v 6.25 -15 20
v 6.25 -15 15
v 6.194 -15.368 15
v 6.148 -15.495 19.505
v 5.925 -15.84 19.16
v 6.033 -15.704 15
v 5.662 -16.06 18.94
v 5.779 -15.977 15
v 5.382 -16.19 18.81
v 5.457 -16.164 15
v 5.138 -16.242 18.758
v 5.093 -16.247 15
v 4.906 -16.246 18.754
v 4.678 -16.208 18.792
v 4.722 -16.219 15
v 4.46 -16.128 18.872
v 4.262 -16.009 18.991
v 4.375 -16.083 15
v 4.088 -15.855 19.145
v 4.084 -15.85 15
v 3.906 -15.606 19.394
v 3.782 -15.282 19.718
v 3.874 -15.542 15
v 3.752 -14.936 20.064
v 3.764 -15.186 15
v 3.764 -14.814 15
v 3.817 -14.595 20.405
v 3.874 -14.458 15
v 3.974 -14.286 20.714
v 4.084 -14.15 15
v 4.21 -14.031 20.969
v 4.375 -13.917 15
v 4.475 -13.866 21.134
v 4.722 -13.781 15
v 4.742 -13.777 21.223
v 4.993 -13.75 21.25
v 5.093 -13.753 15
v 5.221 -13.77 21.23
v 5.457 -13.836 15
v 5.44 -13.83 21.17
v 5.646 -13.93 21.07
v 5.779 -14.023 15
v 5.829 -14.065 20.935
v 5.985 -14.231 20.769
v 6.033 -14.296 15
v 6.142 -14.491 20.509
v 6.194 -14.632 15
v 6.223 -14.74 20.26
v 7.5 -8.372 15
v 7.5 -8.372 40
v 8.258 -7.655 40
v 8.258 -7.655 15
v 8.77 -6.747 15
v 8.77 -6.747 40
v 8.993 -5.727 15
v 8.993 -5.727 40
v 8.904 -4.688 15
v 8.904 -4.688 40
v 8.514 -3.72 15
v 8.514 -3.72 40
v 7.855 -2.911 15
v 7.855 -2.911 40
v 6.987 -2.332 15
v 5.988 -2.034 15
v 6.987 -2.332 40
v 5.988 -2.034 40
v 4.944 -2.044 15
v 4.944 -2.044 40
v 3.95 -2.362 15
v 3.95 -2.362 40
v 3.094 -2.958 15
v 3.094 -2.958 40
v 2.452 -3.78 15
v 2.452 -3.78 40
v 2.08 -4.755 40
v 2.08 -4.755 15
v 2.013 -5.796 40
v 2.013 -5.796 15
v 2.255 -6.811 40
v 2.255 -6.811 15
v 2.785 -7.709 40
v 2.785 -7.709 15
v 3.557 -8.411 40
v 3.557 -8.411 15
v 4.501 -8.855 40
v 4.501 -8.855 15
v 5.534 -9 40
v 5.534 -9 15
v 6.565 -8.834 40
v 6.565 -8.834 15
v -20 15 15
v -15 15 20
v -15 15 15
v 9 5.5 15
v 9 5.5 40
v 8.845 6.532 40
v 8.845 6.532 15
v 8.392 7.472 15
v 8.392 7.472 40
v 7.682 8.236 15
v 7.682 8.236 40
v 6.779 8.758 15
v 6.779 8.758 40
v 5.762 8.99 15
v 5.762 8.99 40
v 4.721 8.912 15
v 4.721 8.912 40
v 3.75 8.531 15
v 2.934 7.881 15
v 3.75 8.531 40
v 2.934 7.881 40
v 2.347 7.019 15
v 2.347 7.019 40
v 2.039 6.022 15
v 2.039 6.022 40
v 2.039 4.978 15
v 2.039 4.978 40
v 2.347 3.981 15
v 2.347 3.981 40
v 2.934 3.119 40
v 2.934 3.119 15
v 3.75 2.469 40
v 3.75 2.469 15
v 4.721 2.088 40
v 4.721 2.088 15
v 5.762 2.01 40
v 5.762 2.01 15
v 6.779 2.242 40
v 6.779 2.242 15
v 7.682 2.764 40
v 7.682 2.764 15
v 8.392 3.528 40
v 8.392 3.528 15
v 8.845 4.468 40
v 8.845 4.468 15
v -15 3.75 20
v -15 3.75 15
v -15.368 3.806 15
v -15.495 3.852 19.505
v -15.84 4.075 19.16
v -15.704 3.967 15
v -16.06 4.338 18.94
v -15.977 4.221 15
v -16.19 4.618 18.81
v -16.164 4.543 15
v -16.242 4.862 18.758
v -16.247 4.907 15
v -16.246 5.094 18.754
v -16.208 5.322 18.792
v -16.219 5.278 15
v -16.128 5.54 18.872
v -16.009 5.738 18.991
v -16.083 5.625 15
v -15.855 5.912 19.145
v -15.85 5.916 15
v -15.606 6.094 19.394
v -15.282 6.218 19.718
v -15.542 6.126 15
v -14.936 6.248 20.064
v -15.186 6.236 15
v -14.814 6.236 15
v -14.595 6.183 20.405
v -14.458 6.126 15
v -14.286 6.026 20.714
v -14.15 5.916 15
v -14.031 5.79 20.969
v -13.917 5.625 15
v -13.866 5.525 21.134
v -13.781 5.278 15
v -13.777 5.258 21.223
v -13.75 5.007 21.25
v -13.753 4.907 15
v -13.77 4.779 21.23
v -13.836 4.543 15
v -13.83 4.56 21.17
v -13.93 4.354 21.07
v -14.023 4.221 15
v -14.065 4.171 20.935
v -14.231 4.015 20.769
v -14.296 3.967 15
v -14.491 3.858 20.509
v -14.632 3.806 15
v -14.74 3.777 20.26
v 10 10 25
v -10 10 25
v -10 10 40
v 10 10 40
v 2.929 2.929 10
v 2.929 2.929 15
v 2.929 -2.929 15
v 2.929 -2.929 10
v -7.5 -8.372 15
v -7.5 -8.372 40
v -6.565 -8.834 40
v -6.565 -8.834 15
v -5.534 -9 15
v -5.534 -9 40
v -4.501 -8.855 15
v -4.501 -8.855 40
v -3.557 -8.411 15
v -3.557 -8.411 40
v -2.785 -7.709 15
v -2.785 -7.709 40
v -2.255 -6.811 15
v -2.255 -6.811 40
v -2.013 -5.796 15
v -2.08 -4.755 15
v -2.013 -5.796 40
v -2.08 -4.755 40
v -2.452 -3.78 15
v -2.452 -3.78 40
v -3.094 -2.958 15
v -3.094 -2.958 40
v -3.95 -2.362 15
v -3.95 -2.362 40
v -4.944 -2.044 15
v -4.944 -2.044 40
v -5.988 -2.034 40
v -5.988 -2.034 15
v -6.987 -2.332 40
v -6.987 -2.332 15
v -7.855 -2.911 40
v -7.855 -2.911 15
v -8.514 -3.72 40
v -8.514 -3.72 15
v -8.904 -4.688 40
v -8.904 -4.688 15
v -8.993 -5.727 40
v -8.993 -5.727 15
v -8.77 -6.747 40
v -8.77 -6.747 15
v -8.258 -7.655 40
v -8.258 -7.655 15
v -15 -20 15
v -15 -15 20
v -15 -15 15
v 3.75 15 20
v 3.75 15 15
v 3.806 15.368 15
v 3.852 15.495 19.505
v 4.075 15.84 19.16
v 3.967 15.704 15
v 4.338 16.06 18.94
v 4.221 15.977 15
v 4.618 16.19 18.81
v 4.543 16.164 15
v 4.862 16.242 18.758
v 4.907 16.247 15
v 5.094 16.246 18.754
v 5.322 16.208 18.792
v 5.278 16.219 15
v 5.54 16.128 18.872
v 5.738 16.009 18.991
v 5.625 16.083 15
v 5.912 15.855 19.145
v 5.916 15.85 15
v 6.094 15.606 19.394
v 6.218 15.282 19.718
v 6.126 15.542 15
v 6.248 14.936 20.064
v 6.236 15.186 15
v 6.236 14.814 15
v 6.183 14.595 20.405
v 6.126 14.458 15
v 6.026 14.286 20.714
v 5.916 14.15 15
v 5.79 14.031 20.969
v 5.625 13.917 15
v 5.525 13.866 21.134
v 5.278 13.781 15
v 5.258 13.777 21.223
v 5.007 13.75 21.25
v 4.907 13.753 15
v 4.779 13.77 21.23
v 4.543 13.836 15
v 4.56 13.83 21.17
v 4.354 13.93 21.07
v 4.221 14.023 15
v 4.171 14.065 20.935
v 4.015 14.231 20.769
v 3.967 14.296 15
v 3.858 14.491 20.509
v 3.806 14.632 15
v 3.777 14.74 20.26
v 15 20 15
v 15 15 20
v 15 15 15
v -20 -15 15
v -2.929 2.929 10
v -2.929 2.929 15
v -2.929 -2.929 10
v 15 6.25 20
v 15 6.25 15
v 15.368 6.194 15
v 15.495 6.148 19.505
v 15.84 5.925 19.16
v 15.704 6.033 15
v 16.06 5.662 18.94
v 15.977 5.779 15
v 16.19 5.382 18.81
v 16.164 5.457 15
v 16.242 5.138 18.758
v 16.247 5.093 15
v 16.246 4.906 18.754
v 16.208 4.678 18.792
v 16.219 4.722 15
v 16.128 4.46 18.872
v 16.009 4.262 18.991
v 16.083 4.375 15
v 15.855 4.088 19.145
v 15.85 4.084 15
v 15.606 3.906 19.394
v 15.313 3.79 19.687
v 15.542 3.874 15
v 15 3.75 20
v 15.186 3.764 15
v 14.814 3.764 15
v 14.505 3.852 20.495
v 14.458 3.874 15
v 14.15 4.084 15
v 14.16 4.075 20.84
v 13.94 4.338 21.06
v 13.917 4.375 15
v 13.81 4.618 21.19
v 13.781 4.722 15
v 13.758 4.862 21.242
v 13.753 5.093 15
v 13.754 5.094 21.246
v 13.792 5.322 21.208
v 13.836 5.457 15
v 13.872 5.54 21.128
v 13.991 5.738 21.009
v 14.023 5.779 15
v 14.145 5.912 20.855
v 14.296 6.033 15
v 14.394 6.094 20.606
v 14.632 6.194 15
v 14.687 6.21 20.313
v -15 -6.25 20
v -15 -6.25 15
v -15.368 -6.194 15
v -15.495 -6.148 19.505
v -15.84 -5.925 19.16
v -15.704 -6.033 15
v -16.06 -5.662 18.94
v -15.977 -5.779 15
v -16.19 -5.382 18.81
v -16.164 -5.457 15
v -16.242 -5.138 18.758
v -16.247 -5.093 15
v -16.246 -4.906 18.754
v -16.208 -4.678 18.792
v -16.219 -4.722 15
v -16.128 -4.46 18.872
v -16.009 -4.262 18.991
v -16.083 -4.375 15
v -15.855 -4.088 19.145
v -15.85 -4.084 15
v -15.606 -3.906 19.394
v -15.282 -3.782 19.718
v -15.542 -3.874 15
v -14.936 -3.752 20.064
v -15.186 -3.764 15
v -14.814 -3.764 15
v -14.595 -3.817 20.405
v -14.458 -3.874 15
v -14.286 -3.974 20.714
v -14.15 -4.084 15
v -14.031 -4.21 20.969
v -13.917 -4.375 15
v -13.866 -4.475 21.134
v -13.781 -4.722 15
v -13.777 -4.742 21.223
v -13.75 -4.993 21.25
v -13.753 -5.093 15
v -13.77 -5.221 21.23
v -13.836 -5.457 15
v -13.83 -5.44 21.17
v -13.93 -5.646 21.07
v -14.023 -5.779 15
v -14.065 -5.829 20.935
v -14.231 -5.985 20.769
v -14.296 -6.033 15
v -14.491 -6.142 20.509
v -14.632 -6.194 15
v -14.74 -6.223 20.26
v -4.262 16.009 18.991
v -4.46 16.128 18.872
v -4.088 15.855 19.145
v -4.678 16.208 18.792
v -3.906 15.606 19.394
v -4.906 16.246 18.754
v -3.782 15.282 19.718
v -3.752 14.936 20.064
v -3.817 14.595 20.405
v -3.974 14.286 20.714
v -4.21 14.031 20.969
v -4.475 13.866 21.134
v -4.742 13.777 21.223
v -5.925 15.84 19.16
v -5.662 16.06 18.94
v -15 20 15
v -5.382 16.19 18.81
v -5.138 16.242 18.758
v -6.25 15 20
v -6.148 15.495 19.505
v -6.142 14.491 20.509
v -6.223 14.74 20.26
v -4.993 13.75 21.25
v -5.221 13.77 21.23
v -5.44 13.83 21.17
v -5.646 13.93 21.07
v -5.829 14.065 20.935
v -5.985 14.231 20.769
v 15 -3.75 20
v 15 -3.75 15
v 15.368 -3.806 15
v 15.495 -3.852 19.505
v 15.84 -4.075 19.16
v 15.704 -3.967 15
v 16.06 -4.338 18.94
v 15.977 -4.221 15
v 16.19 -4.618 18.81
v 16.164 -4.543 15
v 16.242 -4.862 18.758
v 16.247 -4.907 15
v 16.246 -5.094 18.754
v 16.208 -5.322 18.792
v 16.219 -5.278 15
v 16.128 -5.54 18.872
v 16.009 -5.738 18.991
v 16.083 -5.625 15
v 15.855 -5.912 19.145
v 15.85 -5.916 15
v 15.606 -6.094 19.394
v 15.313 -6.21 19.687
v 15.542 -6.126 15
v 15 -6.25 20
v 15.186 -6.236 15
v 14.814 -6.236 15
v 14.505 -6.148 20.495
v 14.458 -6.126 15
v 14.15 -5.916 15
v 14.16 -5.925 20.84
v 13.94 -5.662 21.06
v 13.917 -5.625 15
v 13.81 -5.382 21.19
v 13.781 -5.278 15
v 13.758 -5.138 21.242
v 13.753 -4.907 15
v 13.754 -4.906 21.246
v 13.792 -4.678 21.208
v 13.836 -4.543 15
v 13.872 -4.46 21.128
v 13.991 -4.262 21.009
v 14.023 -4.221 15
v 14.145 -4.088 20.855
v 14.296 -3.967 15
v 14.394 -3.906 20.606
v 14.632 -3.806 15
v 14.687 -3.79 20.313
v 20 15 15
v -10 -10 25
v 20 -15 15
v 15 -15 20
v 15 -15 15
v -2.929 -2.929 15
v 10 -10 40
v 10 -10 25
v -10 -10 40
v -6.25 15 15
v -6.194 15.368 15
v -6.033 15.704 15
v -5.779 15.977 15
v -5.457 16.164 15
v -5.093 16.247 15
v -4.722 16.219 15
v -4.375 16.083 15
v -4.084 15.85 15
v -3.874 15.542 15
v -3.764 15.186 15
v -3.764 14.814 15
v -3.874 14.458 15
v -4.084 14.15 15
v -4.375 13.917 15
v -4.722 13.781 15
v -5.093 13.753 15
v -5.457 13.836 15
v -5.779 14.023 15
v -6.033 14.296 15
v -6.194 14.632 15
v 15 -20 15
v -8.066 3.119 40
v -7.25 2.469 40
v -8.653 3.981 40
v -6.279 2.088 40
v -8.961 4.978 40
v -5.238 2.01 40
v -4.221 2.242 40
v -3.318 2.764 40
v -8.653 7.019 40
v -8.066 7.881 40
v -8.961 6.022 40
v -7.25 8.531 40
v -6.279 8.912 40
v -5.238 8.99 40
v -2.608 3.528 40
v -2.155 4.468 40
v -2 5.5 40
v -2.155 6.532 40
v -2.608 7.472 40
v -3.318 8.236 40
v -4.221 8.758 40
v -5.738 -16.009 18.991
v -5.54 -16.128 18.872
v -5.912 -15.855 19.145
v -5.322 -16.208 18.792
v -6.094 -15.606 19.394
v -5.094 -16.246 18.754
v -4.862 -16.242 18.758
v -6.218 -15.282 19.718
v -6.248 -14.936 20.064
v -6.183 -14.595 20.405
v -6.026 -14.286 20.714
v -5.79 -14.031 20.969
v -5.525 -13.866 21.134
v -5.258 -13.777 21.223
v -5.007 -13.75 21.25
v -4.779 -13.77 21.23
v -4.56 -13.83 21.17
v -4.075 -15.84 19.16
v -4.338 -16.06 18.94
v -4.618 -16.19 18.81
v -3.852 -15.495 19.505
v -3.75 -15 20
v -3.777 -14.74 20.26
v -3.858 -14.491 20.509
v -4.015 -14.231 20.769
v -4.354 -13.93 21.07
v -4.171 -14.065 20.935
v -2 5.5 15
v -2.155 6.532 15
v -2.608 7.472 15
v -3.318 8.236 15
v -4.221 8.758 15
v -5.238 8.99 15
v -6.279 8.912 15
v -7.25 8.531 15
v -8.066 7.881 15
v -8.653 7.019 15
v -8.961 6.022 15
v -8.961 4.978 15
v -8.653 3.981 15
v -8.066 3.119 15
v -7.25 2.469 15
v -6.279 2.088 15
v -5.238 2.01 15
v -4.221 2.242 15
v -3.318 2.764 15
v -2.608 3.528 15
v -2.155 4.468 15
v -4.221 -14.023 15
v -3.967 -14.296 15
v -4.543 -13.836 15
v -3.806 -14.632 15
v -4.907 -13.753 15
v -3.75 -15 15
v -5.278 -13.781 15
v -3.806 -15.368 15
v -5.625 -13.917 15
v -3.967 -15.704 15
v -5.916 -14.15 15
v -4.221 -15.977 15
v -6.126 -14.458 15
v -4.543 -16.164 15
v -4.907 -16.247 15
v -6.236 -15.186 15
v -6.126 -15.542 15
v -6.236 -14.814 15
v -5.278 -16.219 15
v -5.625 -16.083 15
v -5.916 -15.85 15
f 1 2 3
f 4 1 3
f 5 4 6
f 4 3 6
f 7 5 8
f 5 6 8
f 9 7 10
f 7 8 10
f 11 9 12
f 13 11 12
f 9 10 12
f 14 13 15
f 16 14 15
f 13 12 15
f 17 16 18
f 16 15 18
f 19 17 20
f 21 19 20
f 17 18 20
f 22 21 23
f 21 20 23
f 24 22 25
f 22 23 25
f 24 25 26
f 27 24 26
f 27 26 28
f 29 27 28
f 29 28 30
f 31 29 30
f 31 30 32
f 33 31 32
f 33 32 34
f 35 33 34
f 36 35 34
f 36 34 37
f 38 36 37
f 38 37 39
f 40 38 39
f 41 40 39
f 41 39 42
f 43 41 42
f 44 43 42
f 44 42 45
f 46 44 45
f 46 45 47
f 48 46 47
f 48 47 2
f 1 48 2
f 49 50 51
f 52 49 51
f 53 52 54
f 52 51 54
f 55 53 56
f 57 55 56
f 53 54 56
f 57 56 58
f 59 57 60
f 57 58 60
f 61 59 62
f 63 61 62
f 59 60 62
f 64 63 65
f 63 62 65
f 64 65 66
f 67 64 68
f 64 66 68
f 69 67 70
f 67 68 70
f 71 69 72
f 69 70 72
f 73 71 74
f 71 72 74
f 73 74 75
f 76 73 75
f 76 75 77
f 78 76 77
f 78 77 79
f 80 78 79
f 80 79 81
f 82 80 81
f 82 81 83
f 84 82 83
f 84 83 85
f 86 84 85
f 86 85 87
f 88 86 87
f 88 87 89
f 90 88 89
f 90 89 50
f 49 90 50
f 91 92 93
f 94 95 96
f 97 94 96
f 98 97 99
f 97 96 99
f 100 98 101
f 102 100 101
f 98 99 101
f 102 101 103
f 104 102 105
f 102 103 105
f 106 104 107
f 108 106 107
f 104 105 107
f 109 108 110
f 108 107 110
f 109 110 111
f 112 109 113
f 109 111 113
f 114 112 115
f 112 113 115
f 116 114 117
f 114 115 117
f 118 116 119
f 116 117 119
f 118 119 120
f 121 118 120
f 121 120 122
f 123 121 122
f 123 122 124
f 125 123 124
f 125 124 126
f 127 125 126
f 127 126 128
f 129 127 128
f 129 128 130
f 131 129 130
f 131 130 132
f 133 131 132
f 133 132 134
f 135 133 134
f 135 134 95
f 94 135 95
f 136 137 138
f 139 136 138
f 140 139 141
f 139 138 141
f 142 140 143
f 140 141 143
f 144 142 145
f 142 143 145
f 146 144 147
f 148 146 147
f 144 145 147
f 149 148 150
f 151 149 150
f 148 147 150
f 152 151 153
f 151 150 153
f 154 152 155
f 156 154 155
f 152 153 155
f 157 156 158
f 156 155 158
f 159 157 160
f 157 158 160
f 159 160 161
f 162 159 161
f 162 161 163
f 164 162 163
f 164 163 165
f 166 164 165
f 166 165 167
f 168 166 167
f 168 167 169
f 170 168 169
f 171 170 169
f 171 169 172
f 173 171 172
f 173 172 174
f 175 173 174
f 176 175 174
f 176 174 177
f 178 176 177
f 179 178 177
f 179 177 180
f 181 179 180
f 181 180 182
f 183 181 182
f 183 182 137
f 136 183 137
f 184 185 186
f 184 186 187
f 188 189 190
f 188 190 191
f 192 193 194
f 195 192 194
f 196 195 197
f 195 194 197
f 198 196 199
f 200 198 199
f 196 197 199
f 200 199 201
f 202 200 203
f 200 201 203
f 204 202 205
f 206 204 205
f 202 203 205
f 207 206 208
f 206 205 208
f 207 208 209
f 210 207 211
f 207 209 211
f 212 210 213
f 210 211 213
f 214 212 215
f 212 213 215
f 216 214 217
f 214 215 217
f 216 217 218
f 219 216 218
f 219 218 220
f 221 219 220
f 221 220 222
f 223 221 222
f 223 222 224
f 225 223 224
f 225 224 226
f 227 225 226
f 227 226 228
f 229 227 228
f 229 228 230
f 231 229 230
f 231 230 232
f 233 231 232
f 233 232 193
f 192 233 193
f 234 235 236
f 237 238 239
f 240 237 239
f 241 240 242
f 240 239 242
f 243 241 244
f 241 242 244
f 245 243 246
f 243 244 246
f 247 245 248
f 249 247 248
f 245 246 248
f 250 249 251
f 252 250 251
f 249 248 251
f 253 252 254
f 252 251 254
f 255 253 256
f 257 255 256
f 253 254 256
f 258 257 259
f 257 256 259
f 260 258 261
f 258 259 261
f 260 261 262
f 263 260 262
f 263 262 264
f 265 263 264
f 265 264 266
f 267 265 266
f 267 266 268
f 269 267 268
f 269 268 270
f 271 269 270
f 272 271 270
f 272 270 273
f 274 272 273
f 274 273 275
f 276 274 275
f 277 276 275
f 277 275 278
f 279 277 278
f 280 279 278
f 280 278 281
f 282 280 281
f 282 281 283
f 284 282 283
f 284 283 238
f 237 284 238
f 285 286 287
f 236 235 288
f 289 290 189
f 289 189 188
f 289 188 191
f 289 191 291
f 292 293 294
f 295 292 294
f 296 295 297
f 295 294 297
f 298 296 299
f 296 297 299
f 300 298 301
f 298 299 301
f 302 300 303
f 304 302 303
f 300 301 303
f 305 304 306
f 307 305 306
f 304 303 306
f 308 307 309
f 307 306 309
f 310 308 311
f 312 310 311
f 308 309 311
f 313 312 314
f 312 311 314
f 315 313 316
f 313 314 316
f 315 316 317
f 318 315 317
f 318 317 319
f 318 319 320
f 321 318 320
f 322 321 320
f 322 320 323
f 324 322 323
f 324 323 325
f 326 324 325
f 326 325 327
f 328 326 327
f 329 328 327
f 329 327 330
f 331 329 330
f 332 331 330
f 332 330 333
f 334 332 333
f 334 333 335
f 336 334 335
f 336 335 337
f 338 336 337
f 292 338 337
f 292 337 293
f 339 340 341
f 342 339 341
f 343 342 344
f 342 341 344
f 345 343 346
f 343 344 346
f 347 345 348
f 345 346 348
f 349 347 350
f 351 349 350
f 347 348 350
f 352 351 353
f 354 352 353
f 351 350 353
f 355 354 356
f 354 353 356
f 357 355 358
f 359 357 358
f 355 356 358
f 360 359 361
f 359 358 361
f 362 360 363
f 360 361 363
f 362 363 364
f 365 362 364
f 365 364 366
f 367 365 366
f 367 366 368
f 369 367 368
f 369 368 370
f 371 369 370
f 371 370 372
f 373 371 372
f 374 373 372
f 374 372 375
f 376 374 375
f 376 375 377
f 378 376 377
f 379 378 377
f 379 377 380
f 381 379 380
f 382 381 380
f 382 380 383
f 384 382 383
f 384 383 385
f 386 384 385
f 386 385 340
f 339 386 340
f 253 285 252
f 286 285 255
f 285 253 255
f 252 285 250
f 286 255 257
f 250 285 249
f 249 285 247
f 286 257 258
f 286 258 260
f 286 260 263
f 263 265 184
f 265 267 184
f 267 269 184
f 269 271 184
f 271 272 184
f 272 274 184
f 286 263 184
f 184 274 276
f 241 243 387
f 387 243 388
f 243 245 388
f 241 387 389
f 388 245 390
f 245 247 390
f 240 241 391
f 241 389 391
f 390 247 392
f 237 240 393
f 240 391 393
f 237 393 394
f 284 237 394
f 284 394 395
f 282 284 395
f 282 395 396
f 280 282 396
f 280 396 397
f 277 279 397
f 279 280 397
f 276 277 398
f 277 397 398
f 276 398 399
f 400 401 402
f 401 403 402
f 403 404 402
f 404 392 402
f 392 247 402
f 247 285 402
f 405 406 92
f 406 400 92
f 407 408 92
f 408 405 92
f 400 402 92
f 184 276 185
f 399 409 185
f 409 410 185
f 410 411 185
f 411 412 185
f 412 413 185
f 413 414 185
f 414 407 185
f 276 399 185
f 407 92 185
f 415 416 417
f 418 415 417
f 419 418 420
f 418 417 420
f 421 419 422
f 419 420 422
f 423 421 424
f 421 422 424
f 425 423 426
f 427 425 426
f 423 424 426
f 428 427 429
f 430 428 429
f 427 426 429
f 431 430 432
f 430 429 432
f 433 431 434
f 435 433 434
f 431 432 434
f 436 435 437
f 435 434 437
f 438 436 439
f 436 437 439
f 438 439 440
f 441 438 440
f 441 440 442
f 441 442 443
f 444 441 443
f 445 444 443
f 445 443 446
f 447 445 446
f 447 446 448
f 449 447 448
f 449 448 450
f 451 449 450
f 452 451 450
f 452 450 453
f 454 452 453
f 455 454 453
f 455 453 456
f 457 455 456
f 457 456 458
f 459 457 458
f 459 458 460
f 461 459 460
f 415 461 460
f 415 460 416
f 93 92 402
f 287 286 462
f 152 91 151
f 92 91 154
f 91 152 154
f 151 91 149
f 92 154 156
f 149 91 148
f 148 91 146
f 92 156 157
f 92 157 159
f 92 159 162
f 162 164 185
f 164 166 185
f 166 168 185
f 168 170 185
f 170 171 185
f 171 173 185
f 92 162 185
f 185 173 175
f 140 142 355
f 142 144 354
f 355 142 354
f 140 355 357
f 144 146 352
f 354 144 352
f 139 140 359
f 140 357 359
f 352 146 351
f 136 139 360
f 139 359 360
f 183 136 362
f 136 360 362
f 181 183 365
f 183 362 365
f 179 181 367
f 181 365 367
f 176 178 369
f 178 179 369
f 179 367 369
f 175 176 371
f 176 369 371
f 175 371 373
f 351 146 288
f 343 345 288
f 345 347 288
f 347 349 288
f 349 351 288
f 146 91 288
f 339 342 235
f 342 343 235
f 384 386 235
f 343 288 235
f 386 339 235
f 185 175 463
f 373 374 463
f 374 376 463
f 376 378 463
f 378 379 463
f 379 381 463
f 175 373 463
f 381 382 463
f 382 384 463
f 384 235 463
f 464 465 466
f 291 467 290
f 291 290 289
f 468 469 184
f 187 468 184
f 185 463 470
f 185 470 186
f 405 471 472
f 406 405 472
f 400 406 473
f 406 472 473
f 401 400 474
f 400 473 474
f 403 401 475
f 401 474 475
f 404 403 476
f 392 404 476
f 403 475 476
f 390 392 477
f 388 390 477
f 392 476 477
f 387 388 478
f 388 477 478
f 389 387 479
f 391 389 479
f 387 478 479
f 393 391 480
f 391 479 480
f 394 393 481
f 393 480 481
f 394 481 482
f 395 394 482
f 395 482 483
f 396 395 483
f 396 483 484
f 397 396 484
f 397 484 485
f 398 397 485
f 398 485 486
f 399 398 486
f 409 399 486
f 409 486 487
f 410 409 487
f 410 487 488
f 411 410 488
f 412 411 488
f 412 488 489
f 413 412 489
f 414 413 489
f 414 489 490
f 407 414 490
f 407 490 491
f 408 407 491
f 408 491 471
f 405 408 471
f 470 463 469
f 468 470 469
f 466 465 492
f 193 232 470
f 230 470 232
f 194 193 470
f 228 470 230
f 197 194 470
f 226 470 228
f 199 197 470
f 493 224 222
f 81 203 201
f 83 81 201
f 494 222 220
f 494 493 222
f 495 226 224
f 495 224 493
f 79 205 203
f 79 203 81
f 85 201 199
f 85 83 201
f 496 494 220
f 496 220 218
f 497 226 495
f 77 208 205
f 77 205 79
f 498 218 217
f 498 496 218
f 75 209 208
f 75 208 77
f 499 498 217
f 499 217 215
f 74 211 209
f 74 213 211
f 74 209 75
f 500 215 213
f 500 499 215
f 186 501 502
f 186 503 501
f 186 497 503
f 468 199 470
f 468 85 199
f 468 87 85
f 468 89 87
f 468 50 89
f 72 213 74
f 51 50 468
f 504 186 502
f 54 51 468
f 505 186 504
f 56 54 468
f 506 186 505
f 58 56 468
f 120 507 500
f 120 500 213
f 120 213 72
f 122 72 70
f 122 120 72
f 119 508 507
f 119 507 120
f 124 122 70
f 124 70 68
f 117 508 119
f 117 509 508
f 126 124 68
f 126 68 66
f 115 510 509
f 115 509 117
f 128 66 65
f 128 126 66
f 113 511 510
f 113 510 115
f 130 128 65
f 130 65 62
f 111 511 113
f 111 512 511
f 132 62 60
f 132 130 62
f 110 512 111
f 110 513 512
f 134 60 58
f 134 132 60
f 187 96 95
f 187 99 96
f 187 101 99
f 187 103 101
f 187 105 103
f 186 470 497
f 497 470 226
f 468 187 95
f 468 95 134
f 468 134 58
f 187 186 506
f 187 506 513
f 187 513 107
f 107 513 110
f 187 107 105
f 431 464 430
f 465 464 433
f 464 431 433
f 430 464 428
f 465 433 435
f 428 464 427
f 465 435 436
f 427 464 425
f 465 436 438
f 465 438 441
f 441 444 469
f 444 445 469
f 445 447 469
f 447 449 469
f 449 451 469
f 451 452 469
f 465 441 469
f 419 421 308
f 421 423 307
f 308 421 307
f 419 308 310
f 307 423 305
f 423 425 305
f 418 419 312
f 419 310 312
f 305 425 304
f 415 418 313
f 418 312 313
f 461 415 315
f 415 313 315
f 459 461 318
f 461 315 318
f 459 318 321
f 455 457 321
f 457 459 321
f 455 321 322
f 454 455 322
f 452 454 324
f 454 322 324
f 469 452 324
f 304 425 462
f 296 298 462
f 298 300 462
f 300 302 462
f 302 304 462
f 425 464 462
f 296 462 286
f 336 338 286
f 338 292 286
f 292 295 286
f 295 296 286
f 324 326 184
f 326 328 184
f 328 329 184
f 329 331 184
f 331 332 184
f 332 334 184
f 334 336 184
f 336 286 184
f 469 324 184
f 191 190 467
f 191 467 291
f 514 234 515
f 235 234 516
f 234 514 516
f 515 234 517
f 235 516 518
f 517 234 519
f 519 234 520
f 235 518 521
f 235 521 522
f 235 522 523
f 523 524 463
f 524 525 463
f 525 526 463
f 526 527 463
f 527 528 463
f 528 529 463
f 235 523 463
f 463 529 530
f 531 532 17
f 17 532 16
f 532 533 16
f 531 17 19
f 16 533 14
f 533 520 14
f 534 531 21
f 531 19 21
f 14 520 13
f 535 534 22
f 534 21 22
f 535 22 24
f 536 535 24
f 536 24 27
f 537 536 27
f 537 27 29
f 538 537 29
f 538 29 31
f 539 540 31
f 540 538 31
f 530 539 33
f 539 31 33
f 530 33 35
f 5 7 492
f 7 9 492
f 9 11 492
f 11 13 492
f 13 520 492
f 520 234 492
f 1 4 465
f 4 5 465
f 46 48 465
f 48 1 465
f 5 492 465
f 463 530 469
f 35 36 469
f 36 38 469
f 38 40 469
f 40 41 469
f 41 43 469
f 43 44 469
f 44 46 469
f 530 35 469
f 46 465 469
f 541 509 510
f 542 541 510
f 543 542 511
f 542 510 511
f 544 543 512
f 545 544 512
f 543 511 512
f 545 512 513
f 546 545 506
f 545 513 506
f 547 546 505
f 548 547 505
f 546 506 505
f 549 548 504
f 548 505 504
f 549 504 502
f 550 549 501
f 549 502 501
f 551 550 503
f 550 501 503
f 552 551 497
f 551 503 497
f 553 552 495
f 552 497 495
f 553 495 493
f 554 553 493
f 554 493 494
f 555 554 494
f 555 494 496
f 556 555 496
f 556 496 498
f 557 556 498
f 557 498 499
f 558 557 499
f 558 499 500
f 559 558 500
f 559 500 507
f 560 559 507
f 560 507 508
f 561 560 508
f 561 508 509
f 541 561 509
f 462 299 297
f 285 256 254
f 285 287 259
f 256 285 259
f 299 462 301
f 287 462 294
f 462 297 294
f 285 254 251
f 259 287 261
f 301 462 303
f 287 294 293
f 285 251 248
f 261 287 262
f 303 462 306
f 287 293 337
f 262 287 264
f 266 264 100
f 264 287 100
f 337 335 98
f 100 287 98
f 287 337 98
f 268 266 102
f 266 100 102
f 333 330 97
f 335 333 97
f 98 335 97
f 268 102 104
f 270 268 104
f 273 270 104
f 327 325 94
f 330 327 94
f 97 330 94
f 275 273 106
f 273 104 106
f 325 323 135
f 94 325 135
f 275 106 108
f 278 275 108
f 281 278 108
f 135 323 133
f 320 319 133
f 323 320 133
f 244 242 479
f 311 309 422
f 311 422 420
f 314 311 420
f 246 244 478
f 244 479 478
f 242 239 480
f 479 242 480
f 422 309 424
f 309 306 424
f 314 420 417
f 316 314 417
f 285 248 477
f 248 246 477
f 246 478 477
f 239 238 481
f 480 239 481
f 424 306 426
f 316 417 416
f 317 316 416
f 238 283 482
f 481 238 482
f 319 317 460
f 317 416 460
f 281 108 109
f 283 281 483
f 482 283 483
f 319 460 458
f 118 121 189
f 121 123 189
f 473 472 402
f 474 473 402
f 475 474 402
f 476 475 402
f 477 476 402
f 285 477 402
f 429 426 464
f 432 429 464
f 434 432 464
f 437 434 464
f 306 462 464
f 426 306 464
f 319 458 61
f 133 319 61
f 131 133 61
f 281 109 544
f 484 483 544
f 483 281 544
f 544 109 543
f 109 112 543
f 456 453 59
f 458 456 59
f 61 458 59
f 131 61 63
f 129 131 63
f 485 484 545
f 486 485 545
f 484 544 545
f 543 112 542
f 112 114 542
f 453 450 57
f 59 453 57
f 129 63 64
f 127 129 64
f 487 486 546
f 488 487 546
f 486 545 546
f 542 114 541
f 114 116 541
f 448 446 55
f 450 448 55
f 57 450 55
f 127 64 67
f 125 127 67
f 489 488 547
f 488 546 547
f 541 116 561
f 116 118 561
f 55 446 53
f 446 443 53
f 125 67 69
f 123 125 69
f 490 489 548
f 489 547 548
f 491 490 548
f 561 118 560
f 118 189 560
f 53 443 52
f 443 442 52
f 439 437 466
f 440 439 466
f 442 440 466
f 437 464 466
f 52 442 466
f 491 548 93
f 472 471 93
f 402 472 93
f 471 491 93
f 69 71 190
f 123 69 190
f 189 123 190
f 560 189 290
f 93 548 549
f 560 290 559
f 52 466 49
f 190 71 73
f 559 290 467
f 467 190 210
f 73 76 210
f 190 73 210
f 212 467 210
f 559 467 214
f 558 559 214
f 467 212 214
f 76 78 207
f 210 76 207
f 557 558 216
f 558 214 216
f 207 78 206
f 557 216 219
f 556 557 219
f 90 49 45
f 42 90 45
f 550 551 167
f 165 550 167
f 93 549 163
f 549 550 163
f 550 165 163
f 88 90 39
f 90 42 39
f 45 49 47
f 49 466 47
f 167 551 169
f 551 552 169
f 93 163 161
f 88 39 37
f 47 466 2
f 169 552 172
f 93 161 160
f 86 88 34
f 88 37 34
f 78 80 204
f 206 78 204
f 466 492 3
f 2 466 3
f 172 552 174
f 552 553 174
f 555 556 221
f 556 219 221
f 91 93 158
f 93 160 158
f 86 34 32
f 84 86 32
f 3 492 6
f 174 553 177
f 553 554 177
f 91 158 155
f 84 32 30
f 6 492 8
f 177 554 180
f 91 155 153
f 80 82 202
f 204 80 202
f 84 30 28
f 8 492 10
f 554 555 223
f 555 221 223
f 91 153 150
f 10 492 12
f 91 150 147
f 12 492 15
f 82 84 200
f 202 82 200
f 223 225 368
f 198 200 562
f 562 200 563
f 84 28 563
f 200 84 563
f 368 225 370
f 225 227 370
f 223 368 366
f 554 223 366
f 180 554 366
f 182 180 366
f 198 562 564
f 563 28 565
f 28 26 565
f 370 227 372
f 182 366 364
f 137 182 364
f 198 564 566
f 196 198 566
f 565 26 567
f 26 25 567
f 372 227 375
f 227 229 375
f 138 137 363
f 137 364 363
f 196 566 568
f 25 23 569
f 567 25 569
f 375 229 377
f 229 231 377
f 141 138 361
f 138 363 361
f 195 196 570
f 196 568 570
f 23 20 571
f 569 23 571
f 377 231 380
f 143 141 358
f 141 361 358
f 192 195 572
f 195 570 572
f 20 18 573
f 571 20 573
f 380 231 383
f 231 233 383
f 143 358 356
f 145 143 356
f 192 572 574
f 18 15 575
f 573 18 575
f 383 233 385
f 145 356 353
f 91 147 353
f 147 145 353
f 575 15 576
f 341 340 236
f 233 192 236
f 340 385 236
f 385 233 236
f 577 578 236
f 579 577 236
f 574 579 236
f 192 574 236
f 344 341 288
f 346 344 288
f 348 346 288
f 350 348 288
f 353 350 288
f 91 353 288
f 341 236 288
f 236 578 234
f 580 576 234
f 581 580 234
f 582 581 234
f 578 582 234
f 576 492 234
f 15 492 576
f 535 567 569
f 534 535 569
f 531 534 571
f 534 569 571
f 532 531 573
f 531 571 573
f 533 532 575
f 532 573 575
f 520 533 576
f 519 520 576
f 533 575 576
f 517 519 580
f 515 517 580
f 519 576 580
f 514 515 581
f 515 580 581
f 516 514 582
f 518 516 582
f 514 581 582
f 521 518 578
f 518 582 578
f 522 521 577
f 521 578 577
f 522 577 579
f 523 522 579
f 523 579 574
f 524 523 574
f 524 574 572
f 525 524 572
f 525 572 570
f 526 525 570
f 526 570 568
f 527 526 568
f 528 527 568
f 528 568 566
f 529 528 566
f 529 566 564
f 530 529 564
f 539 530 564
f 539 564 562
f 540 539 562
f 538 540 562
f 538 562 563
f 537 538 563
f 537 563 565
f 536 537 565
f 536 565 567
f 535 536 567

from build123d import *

# Parameters (mm, degrees)
SKETCH_1_W                = 20
SKETCH_1_H                = 20
EXTRUDE_1_DEPTH           = 40
SKETCH_2_W                = 10
SKETCH_2_H                = 15
CUT_EXTRUDE_1_DEPTH       = 7.071067812
PATTERN_CIRCULAR_1_COUNT  = 4
SKETCH_5_R                = 3.5
CUT_EXTRUDE_2_DEPTH       = 25
CUT_EXTRUDE_3_DEPTH       = 5
SKETCH_9_W                = 5.878932188
SKETCH_9_H                = 5.878932188
CUT_EXTRUDE_5_DEPTH       = 5
SKETCH_11_W               = 10
SKETCH_11_H               = 30
EXTRUDE_2_DEPTH           = 10
CUT_EXTRUDE_6_DEPTH       = 30
SKETCH_13_R               = 1.25
CUT_EXTRUDE_7_DEPTH       = 10
PATTERN_CIRCULAR_2_COUNT  = 4
SKETCH_16_W               = 20
SKETCH_16_H               = 10
CUT_EXTRUDE_11_DEPTH      = 40
SKETCH_17_W               = 20
SKETCH_17_H               = 20
SKETCH_17_W_2             = 5.857864376
SKETCH_17_H_2             = 5.857864376
CUT_EXTRUDE_12_DEPTH      = 5
CUT_EXTRUDE_13_DEPTH      = 54.851648071
CUT_EXTRUDE_13_DEPTH_BACK = 10


with BuildPart() as part:
    # 스케치1 → 보스-돌출1 (new body)
    with BuildSketch(Plane.XY):
        Rectangle(SKETCH_1_W, SKETCH_1_H)
    extrude(amount=EXTRUDE_1_DEPTH)

    # 스케치2 → 컷-돌출1 (cut)
    with BuildSketch(Plane(origin=(10, 0, 0), x_dir=(0, 0, -1), z_dir=(1, 0, 0))):
        with Locations((-10, 0)):
            Rectangle(SKETCH_2_W, SKETCH_2_H)
    cut_extrude_1 = extrude(amount=-CUT_EXTRUDE_1_DEPTH, mode=Mode.SUBTRACT)

    # 원형 패턴1: 컷-돌출1 ×4 about axis
    pattern_circular_1_axis = Axis((0, 0, 0), (0, 0, 1))
    for i in range(1, PATTERN_CIRCULAR_1_COUNT):
        add(cut_extrude_1.rotate(pattern_circular_1_axis, i * 360 / PATTERN_CIRCULAR_1_COUNT), mode=Mode.SUBTRACT)

    # 스케치5 → 컷-돌출2 (cut)
    with BuildSketch(Plane.XY.offset(40)):
        with Locations((-5.5, 5.5)):
            Circle(SKETCH_5_R)
        with Locations((5.5, 5.5)):
            Circle(SKETCH_5_R)
        with Locations(Location((-5.5, -5.5, 0), (0, 0, 235.150095421))):
            Circle(SKETCH_5_R)
        with Locations(Location((5.5, -5.5, 0), (0, 0, 304.849904579))):
            Circle(SKETCH_5_R)
    extrude(amount=-CUT_EXTRUDE_2_DEPTH, mode=Mode.SUBTRACT)

    # 스케치6 → 컷-돌출3 (cut)
    with BuildSketch(Plane(origin=(0, 0, 0), x_dir=(-1, 0, 0), z_dir=(0, 0, -1))):
        Polygon((-14.808802863, -2.95), (-14.808802863, 2.95), (-2.95, 2.95), (-2.95, 12.360254216), (2.95, 12.360254216), (2.95, 2.95), (13.852115441, 2.95), (13.852115441, -2.95), (2.95, -2.95), (2.95, -13.975695818), (-2.95, -13.975695818), (-2.95, -2.95), align=None)
    extrude(amount=-CUT_EXTRUDE_3_DEPTH, mode=Mode.SUBTRACT)

    # 스케치9 → 컷-돌출5 (cut)
    with BuildSketch(Plane(origin=(0, 0, 5), x_dir=(-1, 0, 0), z_dir=(0, 0, -1))):
        with Locations((0.010533906, -0.010533906)):
            Rectangle(SKETCH_9_W, SKETCH_9_H)
    extrude(amount=-CUT_EXTRUDE_5_DEPTH, mode=Mode.SUBTRACT)

    # 스케치11 → 보스-돌출2 (add)
    with BuildSketch(Plane(origin=(10, 0, 0), x_dir=(0, 0, -1), z_dir=(1, 0, 0))):
        with Locations((-20, 0)):
            Rectangle(SKETCH_11_W, SKETCH_11_H)
    extrude_2 = extrude(amount=EXTRUDE_2_DEPTH)

    # 스케치12 → 컷-돌출6 (cut)
    with BuildSketch(Plane(origin=(0, 15, 0), x_dir=(1, 0, 0), z_dir=(0, 1, 0))):
        Polygon((20, -15), (10, -25), (20, -25), align=None)
    cut_extrude_6 = extrude(amount=-CUT_EXTRUDE_6_DEPTH, mode=Mode.SUBTRACT)

    # 스케치13 → 컷-돌출7 (cut)
    with BuildSketch(Plane(origin=(0, 0, 15), x_dir=(-1, 0, 0), z_dir=(0, 0, -1))):
        with Locations(Location((-15, -5, 0), (0, 0, 90))):
            Circle(SKETCH_13_R)
        with Locations(Location((-15, 5, 0), (0, 0, 90))):
            Circle(SKETCH_13_R)
    cut_extrude_7 = extrude(amount=-CUT_EXTRUDE_7_DEPTH, mode=Mode.SUBTRACT)

    # 원형 패턴2: 보스-돌출2, 컷-돌출6, 컷-돌출7 ×4 about axis
    pattern_circular_2_axis = Axis((0, 0, 0), (0, 0, 1))
    add([extrude_2.rotate(pattern_circular_2_axis, i * 360 / PATTERN_CIRCULAR_2_COUNT) for i in range(1, PATTERN_CIRCULAR_2_COUNT)])
    add([cut_extrude_6.rotate(pattern_circular_2_axis, i * 360 / PATTERN_CIRCULAR_2_COUNT) for i in range(1, PATTERN_CIRCULAR_2_COUNT)], mode=Mode.SUBTRACT)
    add([cut_extrude_7.rotate(pattern_circular_2_axis, i * 360 / PATTERN_CIRCULAR_2_COUNT) for i in range(1, PATTERN_CIRCULAR_2_COUNT)], mode=Mode.SUBTRACT)

    # 스케치16 → 컷-돌출11 (cut)
    with BuildSketch(Plane.XZ.offset(10)):
        with Locations((0, 5)):
            Rectangle(SKETCH_16_W, SKETCH_16_H)
    extrude(amount=-CUT_EXTRUDE_11_DEPTH, mode=Mode.SUBTRACT)

    # 스케치17 → 컷-돌출12 (cut)
    with BuildSketch(Plane(origin=(0, 0, 10), x_dir=(-1, 0, 0), z_dir=(0, 0, -1))):
        Rectangle(SKETCH_17_W, SKETCH_17_H)
        Rectangle(SKETCH_17_W_2, SKETCH_17_H_2, mode=Mode.SUBTRACT)
    extrude(amount=-CUT_EXTRUDE_12_DEPTH, mode=Mode.SUBTRACT)

    # 스케치18 → 컷-돌출13 (cut, two sides: drawn at the far end of the back side and taken through both)
    with BuildSketch(Plane.XZ.offset(-10).offset(-CUT_EXTRUDE_13_DEPTH_BACK)):
        Polygon((10, 25), (15, 25), (15, 20), align=None)
    extrude(amount=CUT_EXTRUDE_13_DEPTH + CUT_EXTRUDE_13_DEPTH_BACK, mode=Mode.SUBTRACT)


solid = part.part
